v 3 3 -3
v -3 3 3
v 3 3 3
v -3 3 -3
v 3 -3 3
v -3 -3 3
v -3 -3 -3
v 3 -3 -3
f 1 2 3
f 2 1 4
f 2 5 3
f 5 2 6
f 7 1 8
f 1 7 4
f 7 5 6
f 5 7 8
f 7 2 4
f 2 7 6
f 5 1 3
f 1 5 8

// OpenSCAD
module erode(r) {
    difference() {
        children();
        minkowski(convexity=2) {
            difference() {
                cube(14, center=true);
                children();
            }
            cube(2*r, center=true);
        }
    }
}

erode(2) cube(10, center=true);
